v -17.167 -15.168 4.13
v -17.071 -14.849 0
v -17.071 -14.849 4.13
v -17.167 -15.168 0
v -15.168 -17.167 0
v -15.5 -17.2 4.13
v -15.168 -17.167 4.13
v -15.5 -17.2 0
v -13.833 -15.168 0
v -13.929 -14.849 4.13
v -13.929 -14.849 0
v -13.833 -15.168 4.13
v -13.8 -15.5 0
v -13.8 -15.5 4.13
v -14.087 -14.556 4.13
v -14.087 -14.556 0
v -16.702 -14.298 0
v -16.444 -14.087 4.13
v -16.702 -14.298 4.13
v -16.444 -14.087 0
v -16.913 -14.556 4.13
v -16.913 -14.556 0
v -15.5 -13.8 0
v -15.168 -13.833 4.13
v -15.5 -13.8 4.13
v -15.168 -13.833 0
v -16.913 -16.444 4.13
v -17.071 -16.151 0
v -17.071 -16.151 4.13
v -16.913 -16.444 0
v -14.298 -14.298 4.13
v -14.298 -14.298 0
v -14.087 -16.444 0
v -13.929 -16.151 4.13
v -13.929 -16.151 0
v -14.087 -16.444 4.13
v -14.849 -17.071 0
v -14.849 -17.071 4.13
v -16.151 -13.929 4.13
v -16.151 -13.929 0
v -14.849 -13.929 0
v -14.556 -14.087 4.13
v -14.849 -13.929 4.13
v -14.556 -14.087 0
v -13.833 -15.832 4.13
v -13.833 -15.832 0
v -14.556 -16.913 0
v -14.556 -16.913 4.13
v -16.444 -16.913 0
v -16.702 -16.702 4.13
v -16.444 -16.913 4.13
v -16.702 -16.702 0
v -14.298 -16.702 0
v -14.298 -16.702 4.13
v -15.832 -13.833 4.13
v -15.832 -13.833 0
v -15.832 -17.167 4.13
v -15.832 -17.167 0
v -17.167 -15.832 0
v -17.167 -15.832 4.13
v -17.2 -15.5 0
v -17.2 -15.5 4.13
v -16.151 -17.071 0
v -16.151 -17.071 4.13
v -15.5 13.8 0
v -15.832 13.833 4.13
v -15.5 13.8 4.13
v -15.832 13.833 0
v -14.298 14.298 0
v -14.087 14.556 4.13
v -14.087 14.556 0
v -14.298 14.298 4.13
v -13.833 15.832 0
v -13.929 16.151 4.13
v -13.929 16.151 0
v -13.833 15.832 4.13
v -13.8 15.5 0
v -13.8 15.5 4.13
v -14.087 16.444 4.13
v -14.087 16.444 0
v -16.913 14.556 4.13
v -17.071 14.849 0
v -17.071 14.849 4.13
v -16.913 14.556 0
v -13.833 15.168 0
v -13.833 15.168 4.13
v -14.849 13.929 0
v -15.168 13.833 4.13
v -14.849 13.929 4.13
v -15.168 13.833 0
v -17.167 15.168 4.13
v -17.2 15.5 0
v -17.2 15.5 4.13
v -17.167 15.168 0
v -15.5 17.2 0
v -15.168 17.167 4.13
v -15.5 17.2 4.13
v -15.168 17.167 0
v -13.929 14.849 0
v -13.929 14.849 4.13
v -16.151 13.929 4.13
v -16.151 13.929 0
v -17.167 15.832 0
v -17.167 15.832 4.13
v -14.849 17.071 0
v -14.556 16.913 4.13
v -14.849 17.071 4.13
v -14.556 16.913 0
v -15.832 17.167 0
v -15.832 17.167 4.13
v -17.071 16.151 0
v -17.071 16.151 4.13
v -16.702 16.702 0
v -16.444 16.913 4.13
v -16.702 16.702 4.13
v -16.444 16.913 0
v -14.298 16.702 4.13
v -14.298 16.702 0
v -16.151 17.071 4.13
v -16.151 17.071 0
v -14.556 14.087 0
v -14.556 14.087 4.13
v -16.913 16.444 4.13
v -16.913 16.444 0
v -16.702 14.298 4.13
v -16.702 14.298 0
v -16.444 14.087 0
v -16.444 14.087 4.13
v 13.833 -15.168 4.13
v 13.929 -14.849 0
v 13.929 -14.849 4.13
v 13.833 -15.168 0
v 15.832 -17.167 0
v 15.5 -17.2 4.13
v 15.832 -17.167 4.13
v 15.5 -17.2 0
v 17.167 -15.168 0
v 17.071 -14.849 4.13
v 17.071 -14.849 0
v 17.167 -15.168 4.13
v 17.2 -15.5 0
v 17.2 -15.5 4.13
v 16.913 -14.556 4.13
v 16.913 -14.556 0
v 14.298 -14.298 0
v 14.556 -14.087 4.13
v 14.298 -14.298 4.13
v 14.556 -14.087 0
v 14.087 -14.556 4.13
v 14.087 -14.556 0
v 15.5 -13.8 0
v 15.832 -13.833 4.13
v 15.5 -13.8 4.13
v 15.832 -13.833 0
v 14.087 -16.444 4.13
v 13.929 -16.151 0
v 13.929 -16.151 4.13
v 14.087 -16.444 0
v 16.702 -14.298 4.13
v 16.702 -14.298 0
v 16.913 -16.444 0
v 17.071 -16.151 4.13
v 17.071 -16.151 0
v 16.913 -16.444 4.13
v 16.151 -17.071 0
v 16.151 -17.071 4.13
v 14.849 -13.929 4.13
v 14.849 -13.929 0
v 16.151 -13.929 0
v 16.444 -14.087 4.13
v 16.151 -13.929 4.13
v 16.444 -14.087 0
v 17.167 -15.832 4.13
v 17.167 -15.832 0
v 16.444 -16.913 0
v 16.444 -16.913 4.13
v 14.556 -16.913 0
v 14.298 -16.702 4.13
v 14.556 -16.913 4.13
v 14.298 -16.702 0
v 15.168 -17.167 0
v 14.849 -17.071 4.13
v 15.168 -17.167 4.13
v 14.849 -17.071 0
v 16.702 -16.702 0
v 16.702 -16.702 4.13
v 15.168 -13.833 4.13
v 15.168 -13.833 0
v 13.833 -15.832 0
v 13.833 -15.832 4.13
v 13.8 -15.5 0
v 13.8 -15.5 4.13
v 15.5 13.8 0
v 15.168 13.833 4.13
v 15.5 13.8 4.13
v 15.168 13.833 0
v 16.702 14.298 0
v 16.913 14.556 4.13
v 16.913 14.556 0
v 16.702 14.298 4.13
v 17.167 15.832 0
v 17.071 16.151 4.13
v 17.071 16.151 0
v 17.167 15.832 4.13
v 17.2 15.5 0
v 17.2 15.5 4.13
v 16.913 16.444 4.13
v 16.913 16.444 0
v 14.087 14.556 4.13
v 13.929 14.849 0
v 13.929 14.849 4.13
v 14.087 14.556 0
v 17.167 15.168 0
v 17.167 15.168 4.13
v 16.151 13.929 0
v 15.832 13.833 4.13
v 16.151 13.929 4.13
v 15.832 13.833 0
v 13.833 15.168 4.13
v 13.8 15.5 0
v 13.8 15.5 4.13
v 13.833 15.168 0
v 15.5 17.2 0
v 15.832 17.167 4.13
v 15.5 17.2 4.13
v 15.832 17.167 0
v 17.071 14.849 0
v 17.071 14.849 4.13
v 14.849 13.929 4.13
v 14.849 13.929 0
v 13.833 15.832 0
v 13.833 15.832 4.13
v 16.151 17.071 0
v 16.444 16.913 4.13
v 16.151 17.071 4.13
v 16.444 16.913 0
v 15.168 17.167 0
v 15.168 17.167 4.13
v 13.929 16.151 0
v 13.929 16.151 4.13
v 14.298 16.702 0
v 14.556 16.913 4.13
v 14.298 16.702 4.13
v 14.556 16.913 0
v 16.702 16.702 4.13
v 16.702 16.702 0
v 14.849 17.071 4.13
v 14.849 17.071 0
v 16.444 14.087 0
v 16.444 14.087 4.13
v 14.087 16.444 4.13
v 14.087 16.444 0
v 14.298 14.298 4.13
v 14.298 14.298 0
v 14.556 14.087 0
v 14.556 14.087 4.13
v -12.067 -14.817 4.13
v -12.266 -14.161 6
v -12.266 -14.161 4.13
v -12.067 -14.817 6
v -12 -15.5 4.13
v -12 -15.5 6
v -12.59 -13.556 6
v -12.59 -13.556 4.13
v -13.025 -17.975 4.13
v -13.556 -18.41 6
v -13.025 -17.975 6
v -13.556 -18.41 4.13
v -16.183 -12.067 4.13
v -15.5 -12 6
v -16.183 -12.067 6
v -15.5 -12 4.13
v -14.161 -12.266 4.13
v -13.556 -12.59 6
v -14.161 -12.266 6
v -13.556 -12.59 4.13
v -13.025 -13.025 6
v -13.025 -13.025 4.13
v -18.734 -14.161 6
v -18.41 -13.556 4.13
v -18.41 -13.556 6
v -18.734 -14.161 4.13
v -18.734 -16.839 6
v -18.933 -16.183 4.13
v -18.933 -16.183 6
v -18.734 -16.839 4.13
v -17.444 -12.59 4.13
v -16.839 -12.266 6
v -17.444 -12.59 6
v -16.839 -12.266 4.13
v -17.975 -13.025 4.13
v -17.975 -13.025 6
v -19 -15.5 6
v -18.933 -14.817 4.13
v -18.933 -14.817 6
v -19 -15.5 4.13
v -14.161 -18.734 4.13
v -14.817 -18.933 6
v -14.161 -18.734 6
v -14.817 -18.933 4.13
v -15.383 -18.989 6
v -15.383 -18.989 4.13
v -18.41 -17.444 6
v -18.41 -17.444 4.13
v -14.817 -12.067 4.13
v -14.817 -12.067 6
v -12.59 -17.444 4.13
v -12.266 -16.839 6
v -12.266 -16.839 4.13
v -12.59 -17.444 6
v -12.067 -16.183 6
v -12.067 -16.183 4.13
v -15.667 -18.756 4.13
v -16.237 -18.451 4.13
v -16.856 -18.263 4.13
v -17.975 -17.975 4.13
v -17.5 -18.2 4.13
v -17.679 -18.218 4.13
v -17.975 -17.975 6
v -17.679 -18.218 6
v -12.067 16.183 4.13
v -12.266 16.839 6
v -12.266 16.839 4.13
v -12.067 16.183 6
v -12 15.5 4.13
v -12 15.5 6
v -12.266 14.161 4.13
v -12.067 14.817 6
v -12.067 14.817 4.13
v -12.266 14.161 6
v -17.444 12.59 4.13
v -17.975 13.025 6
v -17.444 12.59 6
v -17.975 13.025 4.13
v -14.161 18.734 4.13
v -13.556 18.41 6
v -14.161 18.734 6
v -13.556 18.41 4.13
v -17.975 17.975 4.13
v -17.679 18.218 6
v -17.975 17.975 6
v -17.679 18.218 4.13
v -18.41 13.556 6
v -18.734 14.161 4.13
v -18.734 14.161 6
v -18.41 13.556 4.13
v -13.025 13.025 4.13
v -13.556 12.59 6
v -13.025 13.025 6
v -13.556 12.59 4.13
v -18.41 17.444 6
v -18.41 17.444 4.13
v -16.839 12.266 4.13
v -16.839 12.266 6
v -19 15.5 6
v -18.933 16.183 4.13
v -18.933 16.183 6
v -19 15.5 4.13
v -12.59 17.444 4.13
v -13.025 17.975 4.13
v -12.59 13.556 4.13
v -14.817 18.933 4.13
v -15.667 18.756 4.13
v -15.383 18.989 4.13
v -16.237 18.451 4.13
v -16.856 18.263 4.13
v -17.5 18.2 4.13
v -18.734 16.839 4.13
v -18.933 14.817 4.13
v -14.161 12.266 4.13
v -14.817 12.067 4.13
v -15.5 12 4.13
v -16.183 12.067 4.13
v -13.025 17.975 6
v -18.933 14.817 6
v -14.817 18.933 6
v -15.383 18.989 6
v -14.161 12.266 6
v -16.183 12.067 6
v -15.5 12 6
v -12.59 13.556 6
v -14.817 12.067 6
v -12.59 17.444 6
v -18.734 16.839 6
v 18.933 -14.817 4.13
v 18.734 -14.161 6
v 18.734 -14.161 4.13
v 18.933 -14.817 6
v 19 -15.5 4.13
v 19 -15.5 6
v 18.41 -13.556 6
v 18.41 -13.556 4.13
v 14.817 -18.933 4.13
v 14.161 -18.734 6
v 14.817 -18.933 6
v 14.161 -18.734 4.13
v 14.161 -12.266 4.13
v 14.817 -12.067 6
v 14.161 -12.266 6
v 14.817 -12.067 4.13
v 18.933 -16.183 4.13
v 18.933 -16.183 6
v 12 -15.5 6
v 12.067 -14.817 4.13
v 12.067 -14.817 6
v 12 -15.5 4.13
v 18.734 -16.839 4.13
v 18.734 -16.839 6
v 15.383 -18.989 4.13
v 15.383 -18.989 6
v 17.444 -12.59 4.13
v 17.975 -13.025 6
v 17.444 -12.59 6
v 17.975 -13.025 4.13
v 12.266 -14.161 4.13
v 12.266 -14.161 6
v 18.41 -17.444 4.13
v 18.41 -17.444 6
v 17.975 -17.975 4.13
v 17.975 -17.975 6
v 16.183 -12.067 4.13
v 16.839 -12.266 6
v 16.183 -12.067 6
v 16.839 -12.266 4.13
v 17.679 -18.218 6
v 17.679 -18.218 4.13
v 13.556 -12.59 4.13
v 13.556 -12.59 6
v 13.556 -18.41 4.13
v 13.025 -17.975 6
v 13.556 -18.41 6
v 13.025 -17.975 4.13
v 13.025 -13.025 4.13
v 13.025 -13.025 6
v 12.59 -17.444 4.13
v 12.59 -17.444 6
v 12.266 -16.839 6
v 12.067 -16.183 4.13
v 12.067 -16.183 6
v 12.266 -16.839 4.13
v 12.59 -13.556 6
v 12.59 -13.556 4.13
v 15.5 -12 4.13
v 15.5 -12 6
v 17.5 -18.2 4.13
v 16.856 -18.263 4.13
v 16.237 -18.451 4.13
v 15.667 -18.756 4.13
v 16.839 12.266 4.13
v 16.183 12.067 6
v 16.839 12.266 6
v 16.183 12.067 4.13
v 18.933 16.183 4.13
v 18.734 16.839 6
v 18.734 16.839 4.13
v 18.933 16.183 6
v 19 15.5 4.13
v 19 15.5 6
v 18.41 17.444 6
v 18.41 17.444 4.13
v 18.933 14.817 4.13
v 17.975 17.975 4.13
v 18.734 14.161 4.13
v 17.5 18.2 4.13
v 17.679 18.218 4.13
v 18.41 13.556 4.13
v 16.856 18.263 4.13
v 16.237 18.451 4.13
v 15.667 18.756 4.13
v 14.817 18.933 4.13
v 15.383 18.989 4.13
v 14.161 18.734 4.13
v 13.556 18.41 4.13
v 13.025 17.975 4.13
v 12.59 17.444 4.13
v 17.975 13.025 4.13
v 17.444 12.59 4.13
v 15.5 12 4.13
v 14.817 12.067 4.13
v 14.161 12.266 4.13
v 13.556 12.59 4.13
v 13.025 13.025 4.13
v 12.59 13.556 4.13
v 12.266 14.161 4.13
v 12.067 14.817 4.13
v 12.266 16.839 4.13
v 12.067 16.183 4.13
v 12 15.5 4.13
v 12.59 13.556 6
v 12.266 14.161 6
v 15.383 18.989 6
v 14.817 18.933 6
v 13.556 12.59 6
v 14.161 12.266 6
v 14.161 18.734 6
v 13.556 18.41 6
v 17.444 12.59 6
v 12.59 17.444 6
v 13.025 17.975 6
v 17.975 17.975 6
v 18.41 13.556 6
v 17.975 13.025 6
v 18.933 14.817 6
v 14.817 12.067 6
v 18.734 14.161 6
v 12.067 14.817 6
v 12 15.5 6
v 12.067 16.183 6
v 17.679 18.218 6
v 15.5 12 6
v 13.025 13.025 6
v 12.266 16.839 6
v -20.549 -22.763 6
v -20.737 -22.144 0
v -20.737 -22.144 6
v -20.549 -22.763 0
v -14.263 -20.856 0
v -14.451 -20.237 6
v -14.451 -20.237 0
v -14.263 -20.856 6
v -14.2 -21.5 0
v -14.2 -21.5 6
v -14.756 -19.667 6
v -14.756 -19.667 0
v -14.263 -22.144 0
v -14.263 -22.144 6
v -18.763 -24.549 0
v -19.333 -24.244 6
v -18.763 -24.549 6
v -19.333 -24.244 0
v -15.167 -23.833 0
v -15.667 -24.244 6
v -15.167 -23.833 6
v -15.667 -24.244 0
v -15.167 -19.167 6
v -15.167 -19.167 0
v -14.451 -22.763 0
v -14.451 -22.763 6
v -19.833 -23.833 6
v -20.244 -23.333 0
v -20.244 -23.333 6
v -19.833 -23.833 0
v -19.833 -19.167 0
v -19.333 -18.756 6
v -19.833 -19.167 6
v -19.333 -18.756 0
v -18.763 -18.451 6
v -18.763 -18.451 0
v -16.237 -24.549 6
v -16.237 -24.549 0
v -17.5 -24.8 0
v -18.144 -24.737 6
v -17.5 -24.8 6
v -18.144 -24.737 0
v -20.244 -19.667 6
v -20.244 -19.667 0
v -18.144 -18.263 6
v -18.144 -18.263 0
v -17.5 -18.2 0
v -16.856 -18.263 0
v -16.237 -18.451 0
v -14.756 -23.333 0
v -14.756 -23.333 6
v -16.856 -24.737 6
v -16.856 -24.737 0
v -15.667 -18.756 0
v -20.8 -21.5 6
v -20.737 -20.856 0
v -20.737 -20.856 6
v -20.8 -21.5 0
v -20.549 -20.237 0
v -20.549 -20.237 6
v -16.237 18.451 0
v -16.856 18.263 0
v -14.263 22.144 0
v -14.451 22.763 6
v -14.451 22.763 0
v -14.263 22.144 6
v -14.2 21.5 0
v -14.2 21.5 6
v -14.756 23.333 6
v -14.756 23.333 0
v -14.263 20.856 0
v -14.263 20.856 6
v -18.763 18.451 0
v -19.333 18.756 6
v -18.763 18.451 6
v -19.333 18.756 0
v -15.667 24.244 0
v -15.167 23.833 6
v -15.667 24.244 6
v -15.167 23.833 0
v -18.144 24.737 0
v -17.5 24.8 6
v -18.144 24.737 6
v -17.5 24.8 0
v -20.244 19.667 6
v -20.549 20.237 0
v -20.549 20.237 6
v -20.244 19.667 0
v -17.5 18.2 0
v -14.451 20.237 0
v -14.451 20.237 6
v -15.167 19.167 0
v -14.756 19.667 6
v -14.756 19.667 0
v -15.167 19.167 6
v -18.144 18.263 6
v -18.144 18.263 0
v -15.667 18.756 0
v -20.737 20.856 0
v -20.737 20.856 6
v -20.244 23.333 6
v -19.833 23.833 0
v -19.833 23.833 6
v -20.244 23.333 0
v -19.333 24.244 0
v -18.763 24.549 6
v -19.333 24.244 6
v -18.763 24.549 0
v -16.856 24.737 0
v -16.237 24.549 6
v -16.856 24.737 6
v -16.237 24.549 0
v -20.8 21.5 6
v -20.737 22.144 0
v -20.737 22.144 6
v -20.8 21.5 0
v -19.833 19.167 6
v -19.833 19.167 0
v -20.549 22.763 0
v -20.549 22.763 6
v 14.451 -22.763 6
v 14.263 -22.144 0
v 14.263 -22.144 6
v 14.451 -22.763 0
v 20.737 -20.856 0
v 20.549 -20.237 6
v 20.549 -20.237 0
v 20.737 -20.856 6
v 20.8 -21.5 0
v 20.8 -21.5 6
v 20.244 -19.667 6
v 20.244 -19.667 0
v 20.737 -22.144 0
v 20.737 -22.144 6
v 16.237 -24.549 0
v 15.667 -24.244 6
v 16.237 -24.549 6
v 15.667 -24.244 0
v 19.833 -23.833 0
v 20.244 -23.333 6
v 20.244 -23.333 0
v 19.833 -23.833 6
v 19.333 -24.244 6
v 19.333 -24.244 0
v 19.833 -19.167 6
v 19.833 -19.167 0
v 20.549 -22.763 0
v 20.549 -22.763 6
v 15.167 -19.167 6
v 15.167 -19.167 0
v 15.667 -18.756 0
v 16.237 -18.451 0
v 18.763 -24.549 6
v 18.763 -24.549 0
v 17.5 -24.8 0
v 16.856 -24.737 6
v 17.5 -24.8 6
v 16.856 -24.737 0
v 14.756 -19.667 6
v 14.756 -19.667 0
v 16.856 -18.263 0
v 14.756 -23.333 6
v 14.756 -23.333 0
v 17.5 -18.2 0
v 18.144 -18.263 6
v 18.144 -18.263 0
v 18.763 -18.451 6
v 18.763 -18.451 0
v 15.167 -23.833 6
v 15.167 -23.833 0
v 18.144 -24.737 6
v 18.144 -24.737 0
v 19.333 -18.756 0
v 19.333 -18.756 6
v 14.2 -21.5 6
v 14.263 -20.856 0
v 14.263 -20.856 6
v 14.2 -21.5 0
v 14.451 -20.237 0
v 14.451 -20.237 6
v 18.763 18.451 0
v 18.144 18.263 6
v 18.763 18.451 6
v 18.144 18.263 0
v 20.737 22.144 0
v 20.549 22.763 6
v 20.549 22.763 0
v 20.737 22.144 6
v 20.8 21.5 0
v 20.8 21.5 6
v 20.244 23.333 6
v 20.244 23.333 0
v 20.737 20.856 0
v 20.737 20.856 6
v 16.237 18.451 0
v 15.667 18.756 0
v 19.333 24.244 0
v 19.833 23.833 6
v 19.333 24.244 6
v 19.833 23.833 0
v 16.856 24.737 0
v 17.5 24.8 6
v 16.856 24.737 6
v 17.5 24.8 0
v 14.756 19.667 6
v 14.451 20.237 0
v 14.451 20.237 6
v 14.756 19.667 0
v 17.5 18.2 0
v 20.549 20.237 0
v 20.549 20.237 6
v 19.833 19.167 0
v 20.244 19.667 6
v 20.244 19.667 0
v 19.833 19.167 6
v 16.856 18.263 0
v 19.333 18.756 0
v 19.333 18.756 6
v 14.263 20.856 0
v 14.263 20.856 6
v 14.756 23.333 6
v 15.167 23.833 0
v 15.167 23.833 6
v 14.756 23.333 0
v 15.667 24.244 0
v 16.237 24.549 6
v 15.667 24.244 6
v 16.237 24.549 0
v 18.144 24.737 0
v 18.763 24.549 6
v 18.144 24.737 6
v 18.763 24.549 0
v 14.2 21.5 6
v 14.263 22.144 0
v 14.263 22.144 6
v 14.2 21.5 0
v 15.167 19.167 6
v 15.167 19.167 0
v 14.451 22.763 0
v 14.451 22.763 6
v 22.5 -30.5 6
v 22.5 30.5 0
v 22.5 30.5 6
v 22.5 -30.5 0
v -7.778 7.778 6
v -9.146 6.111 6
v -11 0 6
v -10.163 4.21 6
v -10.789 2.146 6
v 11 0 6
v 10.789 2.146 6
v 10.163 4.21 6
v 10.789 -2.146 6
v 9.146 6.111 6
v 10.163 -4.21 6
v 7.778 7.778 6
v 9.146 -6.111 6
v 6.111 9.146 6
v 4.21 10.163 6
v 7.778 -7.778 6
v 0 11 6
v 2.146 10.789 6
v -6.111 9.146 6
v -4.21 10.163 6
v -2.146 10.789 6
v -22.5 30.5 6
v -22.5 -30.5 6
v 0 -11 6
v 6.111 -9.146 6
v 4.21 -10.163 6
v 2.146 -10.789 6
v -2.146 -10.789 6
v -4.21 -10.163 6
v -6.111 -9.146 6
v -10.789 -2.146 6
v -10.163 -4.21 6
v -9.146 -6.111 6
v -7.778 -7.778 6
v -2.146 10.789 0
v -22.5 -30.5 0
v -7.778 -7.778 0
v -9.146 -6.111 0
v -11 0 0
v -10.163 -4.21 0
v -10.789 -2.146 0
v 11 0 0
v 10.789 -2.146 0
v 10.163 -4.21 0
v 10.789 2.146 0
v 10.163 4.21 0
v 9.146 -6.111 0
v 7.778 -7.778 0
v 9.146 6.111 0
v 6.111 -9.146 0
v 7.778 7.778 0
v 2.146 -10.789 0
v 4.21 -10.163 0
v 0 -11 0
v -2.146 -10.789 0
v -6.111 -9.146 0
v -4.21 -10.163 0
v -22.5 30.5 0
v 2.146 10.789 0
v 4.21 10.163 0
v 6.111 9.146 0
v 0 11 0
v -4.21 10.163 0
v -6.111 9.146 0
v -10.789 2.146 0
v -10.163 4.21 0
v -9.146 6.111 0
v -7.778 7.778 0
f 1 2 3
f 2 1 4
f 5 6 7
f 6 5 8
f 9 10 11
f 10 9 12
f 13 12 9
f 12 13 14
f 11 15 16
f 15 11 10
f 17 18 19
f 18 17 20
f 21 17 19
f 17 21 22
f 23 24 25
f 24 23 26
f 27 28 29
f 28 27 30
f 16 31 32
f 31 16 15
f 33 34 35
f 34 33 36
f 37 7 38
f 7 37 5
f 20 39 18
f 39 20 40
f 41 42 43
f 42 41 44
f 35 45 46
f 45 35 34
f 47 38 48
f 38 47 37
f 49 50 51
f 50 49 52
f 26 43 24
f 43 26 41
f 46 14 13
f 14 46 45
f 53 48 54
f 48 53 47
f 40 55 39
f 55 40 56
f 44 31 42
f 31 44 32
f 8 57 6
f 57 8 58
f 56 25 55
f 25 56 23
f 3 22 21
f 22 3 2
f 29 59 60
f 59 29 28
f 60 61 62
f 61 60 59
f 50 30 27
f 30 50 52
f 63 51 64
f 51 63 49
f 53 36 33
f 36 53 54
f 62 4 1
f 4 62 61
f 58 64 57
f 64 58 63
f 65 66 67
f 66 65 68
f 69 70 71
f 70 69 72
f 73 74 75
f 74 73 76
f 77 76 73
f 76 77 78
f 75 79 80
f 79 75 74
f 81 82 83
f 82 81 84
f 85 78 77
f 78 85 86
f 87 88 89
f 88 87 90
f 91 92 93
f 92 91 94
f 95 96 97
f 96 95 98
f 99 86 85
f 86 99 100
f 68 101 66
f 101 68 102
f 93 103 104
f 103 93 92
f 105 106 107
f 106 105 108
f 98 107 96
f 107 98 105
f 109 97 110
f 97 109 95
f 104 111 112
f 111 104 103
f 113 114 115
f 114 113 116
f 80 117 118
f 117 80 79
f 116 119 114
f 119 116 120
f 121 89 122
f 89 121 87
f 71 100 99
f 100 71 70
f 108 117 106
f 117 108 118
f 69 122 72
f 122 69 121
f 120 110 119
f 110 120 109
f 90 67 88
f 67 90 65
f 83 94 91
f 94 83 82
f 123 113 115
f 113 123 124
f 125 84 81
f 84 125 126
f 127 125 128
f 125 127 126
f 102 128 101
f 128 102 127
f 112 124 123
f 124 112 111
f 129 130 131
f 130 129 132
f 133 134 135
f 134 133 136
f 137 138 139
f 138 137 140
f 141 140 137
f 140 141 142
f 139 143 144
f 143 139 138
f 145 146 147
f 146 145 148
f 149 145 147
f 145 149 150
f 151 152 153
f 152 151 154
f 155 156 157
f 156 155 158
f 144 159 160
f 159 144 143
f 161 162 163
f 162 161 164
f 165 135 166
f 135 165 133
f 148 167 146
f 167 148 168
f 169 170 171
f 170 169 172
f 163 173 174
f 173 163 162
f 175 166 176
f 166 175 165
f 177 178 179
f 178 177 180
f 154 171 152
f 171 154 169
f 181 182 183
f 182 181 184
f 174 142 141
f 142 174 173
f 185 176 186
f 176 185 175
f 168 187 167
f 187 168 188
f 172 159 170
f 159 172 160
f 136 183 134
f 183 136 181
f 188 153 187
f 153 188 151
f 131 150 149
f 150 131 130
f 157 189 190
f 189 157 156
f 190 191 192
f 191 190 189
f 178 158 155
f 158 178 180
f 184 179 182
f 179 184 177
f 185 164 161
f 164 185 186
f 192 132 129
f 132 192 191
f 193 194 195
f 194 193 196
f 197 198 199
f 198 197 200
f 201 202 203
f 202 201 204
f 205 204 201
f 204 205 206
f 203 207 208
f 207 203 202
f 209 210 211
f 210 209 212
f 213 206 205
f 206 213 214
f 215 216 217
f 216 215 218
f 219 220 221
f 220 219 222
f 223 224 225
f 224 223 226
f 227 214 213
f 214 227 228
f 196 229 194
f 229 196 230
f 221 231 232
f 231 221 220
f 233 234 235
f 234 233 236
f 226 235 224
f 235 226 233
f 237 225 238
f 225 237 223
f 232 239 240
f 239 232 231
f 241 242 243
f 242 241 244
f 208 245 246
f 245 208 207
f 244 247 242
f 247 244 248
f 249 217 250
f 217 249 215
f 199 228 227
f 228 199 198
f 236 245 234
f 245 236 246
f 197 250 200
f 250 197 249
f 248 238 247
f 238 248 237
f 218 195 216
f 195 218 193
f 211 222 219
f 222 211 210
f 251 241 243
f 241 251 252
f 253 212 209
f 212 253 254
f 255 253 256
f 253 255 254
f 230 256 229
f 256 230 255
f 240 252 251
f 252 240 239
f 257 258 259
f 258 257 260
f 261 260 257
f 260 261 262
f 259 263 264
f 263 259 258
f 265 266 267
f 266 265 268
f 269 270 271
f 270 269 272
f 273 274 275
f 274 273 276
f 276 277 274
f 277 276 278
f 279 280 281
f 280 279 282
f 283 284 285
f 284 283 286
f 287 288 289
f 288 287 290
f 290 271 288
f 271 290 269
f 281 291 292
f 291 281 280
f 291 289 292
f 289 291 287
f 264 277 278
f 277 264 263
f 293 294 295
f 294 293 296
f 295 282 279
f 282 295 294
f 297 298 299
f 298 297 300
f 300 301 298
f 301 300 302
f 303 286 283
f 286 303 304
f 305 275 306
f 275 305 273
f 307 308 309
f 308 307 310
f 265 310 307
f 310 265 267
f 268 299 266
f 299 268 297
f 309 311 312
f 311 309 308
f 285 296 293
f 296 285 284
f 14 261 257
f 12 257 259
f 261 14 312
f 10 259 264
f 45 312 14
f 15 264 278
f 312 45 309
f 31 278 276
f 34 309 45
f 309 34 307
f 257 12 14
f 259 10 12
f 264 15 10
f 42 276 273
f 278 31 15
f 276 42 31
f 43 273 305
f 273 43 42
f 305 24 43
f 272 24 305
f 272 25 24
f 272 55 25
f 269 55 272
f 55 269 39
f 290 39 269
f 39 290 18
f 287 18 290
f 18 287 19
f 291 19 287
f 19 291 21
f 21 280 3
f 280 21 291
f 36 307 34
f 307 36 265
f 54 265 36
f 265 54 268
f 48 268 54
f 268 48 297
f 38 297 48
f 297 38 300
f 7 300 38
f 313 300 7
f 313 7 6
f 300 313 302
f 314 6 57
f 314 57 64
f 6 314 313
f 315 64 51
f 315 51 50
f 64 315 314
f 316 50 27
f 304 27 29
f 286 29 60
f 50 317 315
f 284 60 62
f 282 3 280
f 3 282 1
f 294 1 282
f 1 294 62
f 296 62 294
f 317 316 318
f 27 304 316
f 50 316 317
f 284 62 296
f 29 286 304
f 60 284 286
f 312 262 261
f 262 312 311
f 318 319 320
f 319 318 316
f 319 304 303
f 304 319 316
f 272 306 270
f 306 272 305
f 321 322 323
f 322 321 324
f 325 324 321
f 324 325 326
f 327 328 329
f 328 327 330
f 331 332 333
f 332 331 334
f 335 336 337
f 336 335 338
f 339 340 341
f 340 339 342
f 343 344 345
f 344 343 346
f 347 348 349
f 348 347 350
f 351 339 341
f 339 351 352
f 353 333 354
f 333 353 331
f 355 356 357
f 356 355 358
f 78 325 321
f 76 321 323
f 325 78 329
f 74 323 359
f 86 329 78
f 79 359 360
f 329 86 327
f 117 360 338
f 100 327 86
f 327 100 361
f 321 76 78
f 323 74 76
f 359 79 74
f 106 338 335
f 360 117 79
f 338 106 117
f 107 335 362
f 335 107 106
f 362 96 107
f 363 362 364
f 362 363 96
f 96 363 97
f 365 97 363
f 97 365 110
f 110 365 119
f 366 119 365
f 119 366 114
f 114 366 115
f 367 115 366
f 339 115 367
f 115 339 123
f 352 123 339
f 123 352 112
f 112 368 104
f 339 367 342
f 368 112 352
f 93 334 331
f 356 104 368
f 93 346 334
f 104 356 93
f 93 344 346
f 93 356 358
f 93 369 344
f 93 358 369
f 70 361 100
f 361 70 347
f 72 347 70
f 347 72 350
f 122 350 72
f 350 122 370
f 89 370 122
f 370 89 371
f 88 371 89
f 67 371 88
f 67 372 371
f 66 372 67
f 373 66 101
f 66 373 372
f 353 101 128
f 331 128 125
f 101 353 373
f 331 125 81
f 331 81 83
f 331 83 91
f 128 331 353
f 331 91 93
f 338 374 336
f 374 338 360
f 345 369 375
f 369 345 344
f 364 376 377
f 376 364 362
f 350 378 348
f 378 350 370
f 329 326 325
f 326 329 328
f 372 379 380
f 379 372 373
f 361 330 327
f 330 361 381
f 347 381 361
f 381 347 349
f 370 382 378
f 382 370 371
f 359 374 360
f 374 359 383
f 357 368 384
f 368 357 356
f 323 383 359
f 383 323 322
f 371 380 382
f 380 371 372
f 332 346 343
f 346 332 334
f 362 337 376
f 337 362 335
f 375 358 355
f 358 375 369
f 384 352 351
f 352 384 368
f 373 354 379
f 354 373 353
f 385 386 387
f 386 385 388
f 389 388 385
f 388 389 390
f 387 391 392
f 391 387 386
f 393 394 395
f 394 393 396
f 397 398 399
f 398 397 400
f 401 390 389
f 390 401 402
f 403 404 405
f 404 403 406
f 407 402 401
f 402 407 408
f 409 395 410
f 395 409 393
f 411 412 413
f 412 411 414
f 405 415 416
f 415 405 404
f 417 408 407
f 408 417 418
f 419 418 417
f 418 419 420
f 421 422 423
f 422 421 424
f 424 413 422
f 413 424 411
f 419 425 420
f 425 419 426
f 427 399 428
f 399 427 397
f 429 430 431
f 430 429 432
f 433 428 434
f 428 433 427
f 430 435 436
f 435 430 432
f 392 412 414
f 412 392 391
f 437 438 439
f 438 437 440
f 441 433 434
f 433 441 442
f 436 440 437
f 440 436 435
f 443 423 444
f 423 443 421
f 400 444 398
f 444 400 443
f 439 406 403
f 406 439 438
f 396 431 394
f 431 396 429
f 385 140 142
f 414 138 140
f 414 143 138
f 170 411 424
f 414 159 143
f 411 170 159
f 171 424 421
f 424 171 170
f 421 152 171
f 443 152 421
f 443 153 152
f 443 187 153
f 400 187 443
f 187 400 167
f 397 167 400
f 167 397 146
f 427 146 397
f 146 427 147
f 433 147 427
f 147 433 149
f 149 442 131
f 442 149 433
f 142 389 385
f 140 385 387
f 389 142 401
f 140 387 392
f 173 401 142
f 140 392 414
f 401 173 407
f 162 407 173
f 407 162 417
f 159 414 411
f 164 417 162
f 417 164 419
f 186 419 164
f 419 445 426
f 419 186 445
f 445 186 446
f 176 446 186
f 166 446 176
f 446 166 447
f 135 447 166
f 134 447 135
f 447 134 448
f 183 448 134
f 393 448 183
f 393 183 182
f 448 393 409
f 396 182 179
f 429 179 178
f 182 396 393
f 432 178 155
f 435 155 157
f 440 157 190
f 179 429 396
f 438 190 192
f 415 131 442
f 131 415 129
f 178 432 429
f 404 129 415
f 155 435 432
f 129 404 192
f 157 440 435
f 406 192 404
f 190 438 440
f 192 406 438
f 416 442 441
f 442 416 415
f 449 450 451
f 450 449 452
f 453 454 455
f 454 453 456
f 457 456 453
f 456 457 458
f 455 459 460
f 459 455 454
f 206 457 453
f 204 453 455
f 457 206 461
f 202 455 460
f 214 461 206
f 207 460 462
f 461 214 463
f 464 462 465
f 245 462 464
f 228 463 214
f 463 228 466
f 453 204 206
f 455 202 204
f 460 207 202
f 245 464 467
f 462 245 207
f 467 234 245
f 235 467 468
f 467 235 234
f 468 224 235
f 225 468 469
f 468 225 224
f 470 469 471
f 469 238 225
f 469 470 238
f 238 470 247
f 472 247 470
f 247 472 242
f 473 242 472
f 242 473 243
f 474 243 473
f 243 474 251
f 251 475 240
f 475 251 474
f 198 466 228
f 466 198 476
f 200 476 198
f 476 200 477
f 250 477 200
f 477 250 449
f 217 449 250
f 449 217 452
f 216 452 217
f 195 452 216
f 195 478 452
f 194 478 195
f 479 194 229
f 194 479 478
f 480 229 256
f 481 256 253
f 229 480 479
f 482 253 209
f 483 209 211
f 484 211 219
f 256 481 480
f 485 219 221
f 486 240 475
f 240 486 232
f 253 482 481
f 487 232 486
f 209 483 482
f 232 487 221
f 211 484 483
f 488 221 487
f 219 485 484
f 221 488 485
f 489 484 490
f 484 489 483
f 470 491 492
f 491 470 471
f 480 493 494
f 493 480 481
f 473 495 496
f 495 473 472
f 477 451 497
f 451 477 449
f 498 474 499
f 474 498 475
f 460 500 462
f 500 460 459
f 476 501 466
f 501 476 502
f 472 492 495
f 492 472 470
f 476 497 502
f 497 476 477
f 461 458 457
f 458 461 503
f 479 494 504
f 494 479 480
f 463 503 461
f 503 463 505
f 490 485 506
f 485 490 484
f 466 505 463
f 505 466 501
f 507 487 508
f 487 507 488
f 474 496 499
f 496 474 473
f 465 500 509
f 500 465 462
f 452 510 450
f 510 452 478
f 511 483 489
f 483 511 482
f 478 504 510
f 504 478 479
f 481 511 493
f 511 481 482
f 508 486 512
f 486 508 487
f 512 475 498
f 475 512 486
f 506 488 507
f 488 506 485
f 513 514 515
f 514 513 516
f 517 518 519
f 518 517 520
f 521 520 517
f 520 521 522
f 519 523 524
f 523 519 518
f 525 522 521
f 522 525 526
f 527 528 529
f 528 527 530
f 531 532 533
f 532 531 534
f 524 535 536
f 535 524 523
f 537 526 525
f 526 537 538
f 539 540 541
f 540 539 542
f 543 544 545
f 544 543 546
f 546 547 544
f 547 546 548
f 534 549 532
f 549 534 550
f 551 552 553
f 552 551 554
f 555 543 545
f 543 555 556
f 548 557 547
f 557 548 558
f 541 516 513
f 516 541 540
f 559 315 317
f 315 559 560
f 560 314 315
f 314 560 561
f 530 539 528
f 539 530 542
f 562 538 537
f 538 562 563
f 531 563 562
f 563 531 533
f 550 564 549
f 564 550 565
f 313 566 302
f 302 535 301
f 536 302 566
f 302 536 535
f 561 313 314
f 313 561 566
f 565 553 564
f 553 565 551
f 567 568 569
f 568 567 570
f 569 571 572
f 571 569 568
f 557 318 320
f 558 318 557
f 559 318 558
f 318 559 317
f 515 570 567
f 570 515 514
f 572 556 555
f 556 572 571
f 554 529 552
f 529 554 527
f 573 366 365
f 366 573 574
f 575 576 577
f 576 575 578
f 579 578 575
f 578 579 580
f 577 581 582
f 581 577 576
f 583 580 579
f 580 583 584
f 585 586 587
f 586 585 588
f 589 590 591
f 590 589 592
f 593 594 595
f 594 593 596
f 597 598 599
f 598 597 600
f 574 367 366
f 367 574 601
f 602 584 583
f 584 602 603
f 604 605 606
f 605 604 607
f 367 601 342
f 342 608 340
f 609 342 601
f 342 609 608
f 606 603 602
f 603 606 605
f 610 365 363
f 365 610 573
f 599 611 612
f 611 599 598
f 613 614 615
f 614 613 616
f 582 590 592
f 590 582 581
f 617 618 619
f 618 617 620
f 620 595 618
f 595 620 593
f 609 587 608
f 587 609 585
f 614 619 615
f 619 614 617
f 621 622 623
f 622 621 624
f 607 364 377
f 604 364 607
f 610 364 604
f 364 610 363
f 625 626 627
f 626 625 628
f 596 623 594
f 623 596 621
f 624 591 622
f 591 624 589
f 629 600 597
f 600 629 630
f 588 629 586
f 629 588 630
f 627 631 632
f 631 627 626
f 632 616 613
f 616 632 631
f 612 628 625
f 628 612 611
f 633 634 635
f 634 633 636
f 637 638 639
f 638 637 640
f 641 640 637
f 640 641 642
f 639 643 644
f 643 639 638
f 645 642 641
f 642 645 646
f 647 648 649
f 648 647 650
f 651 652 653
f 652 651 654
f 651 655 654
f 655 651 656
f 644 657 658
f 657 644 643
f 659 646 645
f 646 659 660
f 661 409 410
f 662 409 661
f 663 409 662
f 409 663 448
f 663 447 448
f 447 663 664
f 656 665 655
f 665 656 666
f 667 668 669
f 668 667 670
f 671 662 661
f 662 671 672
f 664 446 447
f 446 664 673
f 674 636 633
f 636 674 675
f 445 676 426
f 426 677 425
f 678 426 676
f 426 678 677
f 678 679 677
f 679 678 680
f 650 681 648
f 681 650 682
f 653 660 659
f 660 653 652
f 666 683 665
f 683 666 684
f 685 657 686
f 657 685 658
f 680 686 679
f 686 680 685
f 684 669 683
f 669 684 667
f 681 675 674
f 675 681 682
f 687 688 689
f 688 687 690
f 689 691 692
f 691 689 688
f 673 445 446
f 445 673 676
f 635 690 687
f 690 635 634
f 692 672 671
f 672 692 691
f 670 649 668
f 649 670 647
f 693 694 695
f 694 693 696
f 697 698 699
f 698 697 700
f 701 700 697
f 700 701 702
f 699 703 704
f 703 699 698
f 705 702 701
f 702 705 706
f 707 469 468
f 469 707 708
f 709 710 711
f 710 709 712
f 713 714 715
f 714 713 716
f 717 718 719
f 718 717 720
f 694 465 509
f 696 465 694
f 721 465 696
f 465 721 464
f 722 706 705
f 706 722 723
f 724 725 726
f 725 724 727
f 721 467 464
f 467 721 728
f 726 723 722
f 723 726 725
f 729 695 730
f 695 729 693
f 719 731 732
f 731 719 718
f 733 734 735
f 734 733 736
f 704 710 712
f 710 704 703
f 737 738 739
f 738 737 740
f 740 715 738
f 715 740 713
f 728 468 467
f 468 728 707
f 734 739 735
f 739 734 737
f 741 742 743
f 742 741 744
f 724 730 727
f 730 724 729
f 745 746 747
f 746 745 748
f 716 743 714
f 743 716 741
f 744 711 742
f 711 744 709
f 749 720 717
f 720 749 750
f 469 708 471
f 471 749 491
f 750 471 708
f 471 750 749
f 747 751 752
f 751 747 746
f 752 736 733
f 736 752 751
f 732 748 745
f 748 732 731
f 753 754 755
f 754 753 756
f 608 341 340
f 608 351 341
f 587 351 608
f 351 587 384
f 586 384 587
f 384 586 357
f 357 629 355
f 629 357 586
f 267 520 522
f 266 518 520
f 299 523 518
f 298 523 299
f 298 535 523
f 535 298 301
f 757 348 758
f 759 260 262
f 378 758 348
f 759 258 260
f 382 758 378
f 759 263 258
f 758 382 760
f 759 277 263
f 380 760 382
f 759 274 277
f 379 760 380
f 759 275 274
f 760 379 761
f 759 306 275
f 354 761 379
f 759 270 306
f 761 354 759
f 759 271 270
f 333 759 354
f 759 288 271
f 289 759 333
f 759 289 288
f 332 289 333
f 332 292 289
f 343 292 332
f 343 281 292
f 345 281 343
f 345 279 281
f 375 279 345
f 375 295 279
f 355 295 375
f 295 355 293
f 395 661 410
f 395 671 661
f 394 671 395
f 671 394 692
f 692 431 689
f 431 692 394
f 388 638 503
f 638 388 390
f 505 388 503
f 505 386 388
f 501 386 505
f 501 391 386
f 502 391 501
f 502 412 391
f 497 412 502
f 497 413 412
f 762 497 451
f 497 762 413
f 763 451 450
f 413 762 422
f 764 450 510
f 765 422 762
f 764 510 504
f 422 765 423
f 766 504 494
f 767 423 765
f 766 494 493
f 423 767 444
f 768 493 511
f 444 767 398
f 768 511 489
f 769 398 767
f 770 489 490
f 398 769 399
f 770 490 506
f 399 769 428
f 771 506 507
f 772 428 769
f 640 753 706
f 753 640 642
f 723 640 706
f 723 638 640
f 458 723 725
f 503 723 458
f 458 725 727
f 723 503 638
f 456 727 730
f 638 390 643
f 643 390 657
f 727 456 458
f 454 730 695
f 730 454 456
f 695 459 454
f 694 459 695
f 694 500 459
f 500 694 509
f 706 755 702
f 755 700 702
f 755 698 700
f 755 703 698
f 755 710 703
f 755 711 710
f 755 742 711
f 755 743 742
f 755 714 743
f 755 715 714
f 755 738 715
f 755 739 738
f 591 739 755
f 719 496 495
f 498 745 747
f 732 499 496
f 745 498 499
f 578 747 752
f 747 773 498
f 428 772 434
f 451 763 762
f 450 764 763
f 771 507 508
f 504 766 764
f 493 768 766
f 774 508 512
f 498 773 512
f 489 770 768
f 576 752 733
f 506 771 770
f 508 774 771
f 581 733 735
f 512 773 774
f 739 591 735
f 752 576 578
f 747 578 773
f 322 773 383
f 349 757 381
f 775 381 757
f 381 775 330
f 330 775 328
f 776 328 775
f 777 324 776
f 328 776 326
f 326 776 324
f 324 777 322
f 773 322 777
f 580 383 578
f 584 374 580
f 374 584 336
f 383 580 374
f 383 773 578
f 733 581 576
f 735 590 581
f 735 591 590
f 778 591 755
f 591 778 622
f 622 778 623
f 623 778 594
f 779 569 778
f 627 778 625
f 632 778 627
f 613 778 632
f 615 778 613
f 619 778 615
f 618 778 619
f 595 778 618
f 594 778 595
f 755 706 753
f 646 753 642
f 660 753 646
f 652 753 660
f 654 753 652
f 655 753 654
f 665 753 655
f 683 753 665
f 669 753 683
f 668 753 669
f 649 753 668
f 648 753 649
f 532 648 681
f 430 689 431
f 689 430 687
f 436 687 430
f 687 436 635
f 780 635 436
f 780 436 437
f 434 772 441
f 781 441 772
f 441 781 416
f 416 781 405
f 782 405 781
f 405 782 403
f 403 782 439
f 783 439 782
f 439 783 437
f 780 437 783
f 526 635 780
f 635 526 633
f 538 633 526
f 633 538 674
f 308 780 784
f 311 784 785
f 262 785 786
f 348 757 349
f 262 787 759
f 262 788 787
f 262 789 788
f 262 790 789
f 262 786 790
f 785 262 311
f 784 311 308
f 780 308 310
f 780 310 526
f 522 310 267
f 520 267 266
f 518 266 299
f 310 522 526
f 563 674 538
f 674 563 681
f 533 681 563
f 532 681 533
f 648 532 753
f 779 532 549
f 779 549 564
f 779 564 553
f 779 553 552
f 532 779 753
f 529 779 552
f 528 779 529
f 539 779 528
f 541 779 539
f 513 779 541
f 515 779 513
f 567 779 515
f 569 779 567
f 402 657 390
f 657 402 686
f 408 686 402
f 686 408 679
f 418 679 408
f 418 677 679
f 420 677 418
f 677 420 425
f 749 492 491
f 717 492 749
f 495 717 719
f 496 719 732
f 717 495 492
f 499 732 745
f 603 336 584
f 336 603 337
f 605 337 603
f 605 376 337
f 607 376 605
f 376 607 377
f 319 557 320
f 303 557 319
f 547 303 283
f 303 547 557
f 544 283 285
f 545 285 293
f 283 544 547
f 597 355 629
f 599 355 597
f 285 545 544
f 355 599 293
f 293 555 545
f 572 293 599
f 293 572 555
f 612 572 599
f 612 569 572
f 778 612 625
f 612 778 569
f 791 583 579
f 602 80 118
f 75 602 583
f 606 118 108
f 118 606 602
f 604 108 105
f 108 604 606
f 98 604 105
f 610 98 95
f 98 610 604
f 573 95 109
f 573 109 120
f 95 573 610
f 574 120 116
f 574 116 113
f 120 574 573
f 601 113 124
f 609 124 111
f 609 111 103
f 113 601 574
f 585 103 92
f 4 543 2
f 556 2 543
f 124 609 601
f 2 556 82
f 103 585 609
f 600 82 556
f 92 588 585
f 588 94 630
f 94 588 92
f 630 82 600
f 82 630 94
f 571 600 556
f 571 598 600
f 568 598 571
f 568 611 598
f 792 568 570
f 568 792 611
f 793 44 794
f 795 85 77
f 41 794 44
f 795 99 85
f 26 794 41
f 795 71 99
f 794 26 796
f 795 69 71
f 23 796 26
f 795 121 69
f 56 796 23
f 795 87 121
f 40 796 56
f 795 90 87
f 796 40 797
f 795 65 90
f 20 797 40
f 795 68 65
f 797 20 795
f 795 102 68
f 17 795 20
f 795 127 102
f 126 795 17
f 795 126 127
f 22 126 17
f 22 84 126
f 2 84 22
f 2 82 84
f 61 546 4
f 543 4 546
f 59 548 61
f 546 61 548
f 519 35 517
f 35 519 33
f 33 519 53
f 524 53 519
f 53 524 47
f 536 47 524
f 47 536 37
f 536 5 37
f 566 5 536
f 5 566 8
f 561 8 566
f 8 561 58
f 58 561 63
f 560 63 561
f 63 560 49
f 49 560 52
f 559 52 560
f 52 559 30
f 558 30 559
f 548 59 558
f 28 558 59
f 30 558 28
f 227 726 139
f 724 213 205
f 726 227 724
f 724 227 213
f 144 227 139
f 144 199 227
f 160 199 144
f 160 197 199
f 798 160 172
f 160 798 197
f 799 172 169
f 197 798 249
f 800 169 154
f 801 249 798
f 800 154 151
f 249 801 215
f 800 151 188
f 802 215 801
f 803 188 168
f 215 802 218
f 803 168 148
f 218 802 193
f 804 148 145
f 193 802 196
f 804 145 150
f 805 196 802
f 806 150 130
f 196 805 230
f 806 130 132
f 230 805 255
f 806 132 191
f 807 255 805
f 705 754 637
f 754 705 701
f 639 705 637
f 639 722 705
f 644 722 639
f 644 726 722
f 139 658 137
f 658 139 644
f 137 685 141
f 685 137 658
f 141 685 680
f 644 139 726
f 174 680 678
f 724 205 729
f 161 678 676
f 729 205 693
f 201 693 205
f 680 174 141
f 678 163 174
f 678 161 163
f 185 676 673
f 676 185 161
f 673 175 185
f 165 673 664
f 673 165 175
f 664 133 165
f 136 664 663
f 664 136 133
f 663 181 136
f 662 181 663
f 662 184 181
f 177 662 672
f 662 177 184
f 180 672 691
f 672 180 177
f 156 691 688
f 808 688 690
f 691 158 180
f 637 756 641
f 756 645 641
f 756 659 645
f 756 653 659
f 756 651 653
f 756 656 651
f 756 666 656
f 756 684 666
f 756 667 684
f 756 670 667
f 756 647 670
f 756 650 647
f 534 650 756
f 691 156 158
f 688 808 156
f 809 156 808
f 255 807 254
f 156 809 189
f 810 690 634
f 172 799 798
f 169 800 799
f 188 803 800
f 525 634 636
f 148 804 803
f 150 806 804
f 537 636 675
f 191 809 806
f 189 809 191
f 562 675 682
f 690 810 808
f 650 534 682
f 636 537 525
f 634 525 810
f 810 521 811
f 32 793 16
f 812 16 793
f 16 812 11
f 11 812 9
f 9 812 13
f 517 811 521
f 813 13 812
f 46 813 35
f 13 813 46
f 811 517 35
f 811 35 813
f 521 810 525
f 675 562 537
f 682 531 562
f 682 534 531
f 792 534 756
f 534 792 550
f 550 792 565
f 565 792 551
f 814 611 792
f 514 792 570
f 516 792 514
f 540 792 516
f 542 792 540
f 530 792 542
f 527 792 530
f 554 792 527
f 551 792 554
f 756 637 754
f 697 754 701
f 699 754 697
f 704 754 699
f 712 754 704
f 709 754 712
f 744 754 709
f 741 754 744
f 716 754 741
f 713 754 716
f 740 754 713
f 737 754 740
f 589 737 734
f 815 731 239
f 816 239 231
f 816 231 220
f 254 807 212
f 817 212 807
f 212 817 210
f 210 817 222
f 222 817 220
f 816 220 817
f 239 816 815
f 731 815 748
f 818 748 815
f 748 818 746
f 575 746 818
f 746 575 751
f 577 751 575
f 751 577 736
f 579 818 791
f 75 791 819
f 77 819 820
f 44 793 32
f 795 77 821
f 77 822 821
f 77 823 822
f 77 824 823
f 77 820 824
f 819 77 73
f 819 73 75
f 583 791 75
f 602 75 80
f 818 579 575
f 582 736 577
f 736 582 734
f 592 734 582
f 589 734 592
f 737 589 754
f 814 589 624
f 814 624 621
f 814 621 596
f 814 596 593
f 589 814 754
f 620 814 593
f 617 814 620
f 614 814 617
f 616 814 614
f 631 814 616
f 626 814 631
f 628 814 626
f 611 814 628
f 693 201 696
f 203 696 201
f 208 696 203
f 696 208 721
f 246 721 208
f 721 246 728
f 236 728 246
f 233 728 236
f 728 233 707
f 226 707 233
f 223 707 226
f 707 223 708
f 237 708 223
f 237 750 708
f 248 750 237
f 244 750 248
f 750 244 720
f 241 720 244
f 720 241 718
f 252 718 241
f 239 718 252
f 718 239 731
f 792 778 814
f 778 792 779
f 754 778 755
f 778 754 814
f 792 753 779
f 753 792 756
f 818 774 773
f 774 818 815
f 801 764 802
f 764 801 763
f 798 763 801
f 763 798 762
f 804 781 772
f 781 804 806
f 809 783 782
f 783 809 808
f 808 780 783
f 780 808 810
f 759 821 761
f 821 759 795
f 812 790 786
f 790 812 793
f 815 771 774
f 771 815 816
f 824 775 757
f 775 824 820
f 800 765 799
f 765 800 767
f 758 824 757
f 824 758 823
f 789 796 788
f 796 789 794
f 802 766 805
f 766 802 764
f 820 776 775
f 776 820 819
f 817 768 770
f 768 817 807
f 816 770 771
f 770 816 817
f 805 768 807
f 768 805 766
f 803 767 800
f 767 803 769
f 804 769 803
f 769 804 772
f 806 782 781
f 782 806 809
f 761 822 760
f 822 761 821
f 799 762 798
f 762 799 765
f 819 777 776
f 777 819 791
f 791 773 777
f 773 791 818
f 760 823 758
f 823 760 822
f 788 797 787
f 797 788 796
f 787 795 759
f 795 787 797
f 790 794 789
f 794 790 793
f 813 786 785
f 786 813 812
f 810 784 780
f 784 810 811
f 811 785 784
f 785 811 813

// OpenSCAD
$fn = 32;

// ----------------------------------------------------------------------
// Motor mount plate: NEMA17, 45 x 61 x 6 mm
// ----------------------------------------------------------------------

// --- parameters (mm) ---
mount_w = 45;             // plate length, X
mount_d = 61;             // plate width, Y
mat_t = 6;                // plate thickness
motor_pitch = 31;         // NEMA17 bolt spacing
motor_d = 3.4;            // NEMA17 screw clearance
center_bore = 22;         // pilot boss bore
cb_d = 7;                 // counterbore seat
cb_h = 1.87;              // counterbore depth
second_d = 6.6;           // second fastener hole

module plate() {
  translate([-mount_w / 2, -mount_d / 2, 0]) cube([mount_w, mount_d, mat_t]);
}

module motor_holes() {
  for (sx = [-1, 1]) for (sy = [-1, 1])
    translate([sx * motor_pitch / 2, sy * motor_pitch / 2, -1])
      cylinder(h = mat_t + 2, d = motor_d);
}
module motor_counterbores() {
  for (sx = [-1, 1]) for (sy = [-1, 1])
    translate([sx * motor_pitch / 2, sy * motor_pitch / 2, mat_t - cb_h])
      cylinder(h = cb_h + 0.6, d = cb_d);
}

difference() {
  union() {
    plate();
  }
  motor_holes();
  translate([0, 0, -1]) cylinder(h = mat_t + 2, d = center_bore);
  motor_counterbores();
  for (sx = [-1, 1]) for (sy = [-1, 1])
    translate([sx * 17.5, sy * 21.5, -1]) cylinder(h = mat_t + 2, d = second_d);
}
